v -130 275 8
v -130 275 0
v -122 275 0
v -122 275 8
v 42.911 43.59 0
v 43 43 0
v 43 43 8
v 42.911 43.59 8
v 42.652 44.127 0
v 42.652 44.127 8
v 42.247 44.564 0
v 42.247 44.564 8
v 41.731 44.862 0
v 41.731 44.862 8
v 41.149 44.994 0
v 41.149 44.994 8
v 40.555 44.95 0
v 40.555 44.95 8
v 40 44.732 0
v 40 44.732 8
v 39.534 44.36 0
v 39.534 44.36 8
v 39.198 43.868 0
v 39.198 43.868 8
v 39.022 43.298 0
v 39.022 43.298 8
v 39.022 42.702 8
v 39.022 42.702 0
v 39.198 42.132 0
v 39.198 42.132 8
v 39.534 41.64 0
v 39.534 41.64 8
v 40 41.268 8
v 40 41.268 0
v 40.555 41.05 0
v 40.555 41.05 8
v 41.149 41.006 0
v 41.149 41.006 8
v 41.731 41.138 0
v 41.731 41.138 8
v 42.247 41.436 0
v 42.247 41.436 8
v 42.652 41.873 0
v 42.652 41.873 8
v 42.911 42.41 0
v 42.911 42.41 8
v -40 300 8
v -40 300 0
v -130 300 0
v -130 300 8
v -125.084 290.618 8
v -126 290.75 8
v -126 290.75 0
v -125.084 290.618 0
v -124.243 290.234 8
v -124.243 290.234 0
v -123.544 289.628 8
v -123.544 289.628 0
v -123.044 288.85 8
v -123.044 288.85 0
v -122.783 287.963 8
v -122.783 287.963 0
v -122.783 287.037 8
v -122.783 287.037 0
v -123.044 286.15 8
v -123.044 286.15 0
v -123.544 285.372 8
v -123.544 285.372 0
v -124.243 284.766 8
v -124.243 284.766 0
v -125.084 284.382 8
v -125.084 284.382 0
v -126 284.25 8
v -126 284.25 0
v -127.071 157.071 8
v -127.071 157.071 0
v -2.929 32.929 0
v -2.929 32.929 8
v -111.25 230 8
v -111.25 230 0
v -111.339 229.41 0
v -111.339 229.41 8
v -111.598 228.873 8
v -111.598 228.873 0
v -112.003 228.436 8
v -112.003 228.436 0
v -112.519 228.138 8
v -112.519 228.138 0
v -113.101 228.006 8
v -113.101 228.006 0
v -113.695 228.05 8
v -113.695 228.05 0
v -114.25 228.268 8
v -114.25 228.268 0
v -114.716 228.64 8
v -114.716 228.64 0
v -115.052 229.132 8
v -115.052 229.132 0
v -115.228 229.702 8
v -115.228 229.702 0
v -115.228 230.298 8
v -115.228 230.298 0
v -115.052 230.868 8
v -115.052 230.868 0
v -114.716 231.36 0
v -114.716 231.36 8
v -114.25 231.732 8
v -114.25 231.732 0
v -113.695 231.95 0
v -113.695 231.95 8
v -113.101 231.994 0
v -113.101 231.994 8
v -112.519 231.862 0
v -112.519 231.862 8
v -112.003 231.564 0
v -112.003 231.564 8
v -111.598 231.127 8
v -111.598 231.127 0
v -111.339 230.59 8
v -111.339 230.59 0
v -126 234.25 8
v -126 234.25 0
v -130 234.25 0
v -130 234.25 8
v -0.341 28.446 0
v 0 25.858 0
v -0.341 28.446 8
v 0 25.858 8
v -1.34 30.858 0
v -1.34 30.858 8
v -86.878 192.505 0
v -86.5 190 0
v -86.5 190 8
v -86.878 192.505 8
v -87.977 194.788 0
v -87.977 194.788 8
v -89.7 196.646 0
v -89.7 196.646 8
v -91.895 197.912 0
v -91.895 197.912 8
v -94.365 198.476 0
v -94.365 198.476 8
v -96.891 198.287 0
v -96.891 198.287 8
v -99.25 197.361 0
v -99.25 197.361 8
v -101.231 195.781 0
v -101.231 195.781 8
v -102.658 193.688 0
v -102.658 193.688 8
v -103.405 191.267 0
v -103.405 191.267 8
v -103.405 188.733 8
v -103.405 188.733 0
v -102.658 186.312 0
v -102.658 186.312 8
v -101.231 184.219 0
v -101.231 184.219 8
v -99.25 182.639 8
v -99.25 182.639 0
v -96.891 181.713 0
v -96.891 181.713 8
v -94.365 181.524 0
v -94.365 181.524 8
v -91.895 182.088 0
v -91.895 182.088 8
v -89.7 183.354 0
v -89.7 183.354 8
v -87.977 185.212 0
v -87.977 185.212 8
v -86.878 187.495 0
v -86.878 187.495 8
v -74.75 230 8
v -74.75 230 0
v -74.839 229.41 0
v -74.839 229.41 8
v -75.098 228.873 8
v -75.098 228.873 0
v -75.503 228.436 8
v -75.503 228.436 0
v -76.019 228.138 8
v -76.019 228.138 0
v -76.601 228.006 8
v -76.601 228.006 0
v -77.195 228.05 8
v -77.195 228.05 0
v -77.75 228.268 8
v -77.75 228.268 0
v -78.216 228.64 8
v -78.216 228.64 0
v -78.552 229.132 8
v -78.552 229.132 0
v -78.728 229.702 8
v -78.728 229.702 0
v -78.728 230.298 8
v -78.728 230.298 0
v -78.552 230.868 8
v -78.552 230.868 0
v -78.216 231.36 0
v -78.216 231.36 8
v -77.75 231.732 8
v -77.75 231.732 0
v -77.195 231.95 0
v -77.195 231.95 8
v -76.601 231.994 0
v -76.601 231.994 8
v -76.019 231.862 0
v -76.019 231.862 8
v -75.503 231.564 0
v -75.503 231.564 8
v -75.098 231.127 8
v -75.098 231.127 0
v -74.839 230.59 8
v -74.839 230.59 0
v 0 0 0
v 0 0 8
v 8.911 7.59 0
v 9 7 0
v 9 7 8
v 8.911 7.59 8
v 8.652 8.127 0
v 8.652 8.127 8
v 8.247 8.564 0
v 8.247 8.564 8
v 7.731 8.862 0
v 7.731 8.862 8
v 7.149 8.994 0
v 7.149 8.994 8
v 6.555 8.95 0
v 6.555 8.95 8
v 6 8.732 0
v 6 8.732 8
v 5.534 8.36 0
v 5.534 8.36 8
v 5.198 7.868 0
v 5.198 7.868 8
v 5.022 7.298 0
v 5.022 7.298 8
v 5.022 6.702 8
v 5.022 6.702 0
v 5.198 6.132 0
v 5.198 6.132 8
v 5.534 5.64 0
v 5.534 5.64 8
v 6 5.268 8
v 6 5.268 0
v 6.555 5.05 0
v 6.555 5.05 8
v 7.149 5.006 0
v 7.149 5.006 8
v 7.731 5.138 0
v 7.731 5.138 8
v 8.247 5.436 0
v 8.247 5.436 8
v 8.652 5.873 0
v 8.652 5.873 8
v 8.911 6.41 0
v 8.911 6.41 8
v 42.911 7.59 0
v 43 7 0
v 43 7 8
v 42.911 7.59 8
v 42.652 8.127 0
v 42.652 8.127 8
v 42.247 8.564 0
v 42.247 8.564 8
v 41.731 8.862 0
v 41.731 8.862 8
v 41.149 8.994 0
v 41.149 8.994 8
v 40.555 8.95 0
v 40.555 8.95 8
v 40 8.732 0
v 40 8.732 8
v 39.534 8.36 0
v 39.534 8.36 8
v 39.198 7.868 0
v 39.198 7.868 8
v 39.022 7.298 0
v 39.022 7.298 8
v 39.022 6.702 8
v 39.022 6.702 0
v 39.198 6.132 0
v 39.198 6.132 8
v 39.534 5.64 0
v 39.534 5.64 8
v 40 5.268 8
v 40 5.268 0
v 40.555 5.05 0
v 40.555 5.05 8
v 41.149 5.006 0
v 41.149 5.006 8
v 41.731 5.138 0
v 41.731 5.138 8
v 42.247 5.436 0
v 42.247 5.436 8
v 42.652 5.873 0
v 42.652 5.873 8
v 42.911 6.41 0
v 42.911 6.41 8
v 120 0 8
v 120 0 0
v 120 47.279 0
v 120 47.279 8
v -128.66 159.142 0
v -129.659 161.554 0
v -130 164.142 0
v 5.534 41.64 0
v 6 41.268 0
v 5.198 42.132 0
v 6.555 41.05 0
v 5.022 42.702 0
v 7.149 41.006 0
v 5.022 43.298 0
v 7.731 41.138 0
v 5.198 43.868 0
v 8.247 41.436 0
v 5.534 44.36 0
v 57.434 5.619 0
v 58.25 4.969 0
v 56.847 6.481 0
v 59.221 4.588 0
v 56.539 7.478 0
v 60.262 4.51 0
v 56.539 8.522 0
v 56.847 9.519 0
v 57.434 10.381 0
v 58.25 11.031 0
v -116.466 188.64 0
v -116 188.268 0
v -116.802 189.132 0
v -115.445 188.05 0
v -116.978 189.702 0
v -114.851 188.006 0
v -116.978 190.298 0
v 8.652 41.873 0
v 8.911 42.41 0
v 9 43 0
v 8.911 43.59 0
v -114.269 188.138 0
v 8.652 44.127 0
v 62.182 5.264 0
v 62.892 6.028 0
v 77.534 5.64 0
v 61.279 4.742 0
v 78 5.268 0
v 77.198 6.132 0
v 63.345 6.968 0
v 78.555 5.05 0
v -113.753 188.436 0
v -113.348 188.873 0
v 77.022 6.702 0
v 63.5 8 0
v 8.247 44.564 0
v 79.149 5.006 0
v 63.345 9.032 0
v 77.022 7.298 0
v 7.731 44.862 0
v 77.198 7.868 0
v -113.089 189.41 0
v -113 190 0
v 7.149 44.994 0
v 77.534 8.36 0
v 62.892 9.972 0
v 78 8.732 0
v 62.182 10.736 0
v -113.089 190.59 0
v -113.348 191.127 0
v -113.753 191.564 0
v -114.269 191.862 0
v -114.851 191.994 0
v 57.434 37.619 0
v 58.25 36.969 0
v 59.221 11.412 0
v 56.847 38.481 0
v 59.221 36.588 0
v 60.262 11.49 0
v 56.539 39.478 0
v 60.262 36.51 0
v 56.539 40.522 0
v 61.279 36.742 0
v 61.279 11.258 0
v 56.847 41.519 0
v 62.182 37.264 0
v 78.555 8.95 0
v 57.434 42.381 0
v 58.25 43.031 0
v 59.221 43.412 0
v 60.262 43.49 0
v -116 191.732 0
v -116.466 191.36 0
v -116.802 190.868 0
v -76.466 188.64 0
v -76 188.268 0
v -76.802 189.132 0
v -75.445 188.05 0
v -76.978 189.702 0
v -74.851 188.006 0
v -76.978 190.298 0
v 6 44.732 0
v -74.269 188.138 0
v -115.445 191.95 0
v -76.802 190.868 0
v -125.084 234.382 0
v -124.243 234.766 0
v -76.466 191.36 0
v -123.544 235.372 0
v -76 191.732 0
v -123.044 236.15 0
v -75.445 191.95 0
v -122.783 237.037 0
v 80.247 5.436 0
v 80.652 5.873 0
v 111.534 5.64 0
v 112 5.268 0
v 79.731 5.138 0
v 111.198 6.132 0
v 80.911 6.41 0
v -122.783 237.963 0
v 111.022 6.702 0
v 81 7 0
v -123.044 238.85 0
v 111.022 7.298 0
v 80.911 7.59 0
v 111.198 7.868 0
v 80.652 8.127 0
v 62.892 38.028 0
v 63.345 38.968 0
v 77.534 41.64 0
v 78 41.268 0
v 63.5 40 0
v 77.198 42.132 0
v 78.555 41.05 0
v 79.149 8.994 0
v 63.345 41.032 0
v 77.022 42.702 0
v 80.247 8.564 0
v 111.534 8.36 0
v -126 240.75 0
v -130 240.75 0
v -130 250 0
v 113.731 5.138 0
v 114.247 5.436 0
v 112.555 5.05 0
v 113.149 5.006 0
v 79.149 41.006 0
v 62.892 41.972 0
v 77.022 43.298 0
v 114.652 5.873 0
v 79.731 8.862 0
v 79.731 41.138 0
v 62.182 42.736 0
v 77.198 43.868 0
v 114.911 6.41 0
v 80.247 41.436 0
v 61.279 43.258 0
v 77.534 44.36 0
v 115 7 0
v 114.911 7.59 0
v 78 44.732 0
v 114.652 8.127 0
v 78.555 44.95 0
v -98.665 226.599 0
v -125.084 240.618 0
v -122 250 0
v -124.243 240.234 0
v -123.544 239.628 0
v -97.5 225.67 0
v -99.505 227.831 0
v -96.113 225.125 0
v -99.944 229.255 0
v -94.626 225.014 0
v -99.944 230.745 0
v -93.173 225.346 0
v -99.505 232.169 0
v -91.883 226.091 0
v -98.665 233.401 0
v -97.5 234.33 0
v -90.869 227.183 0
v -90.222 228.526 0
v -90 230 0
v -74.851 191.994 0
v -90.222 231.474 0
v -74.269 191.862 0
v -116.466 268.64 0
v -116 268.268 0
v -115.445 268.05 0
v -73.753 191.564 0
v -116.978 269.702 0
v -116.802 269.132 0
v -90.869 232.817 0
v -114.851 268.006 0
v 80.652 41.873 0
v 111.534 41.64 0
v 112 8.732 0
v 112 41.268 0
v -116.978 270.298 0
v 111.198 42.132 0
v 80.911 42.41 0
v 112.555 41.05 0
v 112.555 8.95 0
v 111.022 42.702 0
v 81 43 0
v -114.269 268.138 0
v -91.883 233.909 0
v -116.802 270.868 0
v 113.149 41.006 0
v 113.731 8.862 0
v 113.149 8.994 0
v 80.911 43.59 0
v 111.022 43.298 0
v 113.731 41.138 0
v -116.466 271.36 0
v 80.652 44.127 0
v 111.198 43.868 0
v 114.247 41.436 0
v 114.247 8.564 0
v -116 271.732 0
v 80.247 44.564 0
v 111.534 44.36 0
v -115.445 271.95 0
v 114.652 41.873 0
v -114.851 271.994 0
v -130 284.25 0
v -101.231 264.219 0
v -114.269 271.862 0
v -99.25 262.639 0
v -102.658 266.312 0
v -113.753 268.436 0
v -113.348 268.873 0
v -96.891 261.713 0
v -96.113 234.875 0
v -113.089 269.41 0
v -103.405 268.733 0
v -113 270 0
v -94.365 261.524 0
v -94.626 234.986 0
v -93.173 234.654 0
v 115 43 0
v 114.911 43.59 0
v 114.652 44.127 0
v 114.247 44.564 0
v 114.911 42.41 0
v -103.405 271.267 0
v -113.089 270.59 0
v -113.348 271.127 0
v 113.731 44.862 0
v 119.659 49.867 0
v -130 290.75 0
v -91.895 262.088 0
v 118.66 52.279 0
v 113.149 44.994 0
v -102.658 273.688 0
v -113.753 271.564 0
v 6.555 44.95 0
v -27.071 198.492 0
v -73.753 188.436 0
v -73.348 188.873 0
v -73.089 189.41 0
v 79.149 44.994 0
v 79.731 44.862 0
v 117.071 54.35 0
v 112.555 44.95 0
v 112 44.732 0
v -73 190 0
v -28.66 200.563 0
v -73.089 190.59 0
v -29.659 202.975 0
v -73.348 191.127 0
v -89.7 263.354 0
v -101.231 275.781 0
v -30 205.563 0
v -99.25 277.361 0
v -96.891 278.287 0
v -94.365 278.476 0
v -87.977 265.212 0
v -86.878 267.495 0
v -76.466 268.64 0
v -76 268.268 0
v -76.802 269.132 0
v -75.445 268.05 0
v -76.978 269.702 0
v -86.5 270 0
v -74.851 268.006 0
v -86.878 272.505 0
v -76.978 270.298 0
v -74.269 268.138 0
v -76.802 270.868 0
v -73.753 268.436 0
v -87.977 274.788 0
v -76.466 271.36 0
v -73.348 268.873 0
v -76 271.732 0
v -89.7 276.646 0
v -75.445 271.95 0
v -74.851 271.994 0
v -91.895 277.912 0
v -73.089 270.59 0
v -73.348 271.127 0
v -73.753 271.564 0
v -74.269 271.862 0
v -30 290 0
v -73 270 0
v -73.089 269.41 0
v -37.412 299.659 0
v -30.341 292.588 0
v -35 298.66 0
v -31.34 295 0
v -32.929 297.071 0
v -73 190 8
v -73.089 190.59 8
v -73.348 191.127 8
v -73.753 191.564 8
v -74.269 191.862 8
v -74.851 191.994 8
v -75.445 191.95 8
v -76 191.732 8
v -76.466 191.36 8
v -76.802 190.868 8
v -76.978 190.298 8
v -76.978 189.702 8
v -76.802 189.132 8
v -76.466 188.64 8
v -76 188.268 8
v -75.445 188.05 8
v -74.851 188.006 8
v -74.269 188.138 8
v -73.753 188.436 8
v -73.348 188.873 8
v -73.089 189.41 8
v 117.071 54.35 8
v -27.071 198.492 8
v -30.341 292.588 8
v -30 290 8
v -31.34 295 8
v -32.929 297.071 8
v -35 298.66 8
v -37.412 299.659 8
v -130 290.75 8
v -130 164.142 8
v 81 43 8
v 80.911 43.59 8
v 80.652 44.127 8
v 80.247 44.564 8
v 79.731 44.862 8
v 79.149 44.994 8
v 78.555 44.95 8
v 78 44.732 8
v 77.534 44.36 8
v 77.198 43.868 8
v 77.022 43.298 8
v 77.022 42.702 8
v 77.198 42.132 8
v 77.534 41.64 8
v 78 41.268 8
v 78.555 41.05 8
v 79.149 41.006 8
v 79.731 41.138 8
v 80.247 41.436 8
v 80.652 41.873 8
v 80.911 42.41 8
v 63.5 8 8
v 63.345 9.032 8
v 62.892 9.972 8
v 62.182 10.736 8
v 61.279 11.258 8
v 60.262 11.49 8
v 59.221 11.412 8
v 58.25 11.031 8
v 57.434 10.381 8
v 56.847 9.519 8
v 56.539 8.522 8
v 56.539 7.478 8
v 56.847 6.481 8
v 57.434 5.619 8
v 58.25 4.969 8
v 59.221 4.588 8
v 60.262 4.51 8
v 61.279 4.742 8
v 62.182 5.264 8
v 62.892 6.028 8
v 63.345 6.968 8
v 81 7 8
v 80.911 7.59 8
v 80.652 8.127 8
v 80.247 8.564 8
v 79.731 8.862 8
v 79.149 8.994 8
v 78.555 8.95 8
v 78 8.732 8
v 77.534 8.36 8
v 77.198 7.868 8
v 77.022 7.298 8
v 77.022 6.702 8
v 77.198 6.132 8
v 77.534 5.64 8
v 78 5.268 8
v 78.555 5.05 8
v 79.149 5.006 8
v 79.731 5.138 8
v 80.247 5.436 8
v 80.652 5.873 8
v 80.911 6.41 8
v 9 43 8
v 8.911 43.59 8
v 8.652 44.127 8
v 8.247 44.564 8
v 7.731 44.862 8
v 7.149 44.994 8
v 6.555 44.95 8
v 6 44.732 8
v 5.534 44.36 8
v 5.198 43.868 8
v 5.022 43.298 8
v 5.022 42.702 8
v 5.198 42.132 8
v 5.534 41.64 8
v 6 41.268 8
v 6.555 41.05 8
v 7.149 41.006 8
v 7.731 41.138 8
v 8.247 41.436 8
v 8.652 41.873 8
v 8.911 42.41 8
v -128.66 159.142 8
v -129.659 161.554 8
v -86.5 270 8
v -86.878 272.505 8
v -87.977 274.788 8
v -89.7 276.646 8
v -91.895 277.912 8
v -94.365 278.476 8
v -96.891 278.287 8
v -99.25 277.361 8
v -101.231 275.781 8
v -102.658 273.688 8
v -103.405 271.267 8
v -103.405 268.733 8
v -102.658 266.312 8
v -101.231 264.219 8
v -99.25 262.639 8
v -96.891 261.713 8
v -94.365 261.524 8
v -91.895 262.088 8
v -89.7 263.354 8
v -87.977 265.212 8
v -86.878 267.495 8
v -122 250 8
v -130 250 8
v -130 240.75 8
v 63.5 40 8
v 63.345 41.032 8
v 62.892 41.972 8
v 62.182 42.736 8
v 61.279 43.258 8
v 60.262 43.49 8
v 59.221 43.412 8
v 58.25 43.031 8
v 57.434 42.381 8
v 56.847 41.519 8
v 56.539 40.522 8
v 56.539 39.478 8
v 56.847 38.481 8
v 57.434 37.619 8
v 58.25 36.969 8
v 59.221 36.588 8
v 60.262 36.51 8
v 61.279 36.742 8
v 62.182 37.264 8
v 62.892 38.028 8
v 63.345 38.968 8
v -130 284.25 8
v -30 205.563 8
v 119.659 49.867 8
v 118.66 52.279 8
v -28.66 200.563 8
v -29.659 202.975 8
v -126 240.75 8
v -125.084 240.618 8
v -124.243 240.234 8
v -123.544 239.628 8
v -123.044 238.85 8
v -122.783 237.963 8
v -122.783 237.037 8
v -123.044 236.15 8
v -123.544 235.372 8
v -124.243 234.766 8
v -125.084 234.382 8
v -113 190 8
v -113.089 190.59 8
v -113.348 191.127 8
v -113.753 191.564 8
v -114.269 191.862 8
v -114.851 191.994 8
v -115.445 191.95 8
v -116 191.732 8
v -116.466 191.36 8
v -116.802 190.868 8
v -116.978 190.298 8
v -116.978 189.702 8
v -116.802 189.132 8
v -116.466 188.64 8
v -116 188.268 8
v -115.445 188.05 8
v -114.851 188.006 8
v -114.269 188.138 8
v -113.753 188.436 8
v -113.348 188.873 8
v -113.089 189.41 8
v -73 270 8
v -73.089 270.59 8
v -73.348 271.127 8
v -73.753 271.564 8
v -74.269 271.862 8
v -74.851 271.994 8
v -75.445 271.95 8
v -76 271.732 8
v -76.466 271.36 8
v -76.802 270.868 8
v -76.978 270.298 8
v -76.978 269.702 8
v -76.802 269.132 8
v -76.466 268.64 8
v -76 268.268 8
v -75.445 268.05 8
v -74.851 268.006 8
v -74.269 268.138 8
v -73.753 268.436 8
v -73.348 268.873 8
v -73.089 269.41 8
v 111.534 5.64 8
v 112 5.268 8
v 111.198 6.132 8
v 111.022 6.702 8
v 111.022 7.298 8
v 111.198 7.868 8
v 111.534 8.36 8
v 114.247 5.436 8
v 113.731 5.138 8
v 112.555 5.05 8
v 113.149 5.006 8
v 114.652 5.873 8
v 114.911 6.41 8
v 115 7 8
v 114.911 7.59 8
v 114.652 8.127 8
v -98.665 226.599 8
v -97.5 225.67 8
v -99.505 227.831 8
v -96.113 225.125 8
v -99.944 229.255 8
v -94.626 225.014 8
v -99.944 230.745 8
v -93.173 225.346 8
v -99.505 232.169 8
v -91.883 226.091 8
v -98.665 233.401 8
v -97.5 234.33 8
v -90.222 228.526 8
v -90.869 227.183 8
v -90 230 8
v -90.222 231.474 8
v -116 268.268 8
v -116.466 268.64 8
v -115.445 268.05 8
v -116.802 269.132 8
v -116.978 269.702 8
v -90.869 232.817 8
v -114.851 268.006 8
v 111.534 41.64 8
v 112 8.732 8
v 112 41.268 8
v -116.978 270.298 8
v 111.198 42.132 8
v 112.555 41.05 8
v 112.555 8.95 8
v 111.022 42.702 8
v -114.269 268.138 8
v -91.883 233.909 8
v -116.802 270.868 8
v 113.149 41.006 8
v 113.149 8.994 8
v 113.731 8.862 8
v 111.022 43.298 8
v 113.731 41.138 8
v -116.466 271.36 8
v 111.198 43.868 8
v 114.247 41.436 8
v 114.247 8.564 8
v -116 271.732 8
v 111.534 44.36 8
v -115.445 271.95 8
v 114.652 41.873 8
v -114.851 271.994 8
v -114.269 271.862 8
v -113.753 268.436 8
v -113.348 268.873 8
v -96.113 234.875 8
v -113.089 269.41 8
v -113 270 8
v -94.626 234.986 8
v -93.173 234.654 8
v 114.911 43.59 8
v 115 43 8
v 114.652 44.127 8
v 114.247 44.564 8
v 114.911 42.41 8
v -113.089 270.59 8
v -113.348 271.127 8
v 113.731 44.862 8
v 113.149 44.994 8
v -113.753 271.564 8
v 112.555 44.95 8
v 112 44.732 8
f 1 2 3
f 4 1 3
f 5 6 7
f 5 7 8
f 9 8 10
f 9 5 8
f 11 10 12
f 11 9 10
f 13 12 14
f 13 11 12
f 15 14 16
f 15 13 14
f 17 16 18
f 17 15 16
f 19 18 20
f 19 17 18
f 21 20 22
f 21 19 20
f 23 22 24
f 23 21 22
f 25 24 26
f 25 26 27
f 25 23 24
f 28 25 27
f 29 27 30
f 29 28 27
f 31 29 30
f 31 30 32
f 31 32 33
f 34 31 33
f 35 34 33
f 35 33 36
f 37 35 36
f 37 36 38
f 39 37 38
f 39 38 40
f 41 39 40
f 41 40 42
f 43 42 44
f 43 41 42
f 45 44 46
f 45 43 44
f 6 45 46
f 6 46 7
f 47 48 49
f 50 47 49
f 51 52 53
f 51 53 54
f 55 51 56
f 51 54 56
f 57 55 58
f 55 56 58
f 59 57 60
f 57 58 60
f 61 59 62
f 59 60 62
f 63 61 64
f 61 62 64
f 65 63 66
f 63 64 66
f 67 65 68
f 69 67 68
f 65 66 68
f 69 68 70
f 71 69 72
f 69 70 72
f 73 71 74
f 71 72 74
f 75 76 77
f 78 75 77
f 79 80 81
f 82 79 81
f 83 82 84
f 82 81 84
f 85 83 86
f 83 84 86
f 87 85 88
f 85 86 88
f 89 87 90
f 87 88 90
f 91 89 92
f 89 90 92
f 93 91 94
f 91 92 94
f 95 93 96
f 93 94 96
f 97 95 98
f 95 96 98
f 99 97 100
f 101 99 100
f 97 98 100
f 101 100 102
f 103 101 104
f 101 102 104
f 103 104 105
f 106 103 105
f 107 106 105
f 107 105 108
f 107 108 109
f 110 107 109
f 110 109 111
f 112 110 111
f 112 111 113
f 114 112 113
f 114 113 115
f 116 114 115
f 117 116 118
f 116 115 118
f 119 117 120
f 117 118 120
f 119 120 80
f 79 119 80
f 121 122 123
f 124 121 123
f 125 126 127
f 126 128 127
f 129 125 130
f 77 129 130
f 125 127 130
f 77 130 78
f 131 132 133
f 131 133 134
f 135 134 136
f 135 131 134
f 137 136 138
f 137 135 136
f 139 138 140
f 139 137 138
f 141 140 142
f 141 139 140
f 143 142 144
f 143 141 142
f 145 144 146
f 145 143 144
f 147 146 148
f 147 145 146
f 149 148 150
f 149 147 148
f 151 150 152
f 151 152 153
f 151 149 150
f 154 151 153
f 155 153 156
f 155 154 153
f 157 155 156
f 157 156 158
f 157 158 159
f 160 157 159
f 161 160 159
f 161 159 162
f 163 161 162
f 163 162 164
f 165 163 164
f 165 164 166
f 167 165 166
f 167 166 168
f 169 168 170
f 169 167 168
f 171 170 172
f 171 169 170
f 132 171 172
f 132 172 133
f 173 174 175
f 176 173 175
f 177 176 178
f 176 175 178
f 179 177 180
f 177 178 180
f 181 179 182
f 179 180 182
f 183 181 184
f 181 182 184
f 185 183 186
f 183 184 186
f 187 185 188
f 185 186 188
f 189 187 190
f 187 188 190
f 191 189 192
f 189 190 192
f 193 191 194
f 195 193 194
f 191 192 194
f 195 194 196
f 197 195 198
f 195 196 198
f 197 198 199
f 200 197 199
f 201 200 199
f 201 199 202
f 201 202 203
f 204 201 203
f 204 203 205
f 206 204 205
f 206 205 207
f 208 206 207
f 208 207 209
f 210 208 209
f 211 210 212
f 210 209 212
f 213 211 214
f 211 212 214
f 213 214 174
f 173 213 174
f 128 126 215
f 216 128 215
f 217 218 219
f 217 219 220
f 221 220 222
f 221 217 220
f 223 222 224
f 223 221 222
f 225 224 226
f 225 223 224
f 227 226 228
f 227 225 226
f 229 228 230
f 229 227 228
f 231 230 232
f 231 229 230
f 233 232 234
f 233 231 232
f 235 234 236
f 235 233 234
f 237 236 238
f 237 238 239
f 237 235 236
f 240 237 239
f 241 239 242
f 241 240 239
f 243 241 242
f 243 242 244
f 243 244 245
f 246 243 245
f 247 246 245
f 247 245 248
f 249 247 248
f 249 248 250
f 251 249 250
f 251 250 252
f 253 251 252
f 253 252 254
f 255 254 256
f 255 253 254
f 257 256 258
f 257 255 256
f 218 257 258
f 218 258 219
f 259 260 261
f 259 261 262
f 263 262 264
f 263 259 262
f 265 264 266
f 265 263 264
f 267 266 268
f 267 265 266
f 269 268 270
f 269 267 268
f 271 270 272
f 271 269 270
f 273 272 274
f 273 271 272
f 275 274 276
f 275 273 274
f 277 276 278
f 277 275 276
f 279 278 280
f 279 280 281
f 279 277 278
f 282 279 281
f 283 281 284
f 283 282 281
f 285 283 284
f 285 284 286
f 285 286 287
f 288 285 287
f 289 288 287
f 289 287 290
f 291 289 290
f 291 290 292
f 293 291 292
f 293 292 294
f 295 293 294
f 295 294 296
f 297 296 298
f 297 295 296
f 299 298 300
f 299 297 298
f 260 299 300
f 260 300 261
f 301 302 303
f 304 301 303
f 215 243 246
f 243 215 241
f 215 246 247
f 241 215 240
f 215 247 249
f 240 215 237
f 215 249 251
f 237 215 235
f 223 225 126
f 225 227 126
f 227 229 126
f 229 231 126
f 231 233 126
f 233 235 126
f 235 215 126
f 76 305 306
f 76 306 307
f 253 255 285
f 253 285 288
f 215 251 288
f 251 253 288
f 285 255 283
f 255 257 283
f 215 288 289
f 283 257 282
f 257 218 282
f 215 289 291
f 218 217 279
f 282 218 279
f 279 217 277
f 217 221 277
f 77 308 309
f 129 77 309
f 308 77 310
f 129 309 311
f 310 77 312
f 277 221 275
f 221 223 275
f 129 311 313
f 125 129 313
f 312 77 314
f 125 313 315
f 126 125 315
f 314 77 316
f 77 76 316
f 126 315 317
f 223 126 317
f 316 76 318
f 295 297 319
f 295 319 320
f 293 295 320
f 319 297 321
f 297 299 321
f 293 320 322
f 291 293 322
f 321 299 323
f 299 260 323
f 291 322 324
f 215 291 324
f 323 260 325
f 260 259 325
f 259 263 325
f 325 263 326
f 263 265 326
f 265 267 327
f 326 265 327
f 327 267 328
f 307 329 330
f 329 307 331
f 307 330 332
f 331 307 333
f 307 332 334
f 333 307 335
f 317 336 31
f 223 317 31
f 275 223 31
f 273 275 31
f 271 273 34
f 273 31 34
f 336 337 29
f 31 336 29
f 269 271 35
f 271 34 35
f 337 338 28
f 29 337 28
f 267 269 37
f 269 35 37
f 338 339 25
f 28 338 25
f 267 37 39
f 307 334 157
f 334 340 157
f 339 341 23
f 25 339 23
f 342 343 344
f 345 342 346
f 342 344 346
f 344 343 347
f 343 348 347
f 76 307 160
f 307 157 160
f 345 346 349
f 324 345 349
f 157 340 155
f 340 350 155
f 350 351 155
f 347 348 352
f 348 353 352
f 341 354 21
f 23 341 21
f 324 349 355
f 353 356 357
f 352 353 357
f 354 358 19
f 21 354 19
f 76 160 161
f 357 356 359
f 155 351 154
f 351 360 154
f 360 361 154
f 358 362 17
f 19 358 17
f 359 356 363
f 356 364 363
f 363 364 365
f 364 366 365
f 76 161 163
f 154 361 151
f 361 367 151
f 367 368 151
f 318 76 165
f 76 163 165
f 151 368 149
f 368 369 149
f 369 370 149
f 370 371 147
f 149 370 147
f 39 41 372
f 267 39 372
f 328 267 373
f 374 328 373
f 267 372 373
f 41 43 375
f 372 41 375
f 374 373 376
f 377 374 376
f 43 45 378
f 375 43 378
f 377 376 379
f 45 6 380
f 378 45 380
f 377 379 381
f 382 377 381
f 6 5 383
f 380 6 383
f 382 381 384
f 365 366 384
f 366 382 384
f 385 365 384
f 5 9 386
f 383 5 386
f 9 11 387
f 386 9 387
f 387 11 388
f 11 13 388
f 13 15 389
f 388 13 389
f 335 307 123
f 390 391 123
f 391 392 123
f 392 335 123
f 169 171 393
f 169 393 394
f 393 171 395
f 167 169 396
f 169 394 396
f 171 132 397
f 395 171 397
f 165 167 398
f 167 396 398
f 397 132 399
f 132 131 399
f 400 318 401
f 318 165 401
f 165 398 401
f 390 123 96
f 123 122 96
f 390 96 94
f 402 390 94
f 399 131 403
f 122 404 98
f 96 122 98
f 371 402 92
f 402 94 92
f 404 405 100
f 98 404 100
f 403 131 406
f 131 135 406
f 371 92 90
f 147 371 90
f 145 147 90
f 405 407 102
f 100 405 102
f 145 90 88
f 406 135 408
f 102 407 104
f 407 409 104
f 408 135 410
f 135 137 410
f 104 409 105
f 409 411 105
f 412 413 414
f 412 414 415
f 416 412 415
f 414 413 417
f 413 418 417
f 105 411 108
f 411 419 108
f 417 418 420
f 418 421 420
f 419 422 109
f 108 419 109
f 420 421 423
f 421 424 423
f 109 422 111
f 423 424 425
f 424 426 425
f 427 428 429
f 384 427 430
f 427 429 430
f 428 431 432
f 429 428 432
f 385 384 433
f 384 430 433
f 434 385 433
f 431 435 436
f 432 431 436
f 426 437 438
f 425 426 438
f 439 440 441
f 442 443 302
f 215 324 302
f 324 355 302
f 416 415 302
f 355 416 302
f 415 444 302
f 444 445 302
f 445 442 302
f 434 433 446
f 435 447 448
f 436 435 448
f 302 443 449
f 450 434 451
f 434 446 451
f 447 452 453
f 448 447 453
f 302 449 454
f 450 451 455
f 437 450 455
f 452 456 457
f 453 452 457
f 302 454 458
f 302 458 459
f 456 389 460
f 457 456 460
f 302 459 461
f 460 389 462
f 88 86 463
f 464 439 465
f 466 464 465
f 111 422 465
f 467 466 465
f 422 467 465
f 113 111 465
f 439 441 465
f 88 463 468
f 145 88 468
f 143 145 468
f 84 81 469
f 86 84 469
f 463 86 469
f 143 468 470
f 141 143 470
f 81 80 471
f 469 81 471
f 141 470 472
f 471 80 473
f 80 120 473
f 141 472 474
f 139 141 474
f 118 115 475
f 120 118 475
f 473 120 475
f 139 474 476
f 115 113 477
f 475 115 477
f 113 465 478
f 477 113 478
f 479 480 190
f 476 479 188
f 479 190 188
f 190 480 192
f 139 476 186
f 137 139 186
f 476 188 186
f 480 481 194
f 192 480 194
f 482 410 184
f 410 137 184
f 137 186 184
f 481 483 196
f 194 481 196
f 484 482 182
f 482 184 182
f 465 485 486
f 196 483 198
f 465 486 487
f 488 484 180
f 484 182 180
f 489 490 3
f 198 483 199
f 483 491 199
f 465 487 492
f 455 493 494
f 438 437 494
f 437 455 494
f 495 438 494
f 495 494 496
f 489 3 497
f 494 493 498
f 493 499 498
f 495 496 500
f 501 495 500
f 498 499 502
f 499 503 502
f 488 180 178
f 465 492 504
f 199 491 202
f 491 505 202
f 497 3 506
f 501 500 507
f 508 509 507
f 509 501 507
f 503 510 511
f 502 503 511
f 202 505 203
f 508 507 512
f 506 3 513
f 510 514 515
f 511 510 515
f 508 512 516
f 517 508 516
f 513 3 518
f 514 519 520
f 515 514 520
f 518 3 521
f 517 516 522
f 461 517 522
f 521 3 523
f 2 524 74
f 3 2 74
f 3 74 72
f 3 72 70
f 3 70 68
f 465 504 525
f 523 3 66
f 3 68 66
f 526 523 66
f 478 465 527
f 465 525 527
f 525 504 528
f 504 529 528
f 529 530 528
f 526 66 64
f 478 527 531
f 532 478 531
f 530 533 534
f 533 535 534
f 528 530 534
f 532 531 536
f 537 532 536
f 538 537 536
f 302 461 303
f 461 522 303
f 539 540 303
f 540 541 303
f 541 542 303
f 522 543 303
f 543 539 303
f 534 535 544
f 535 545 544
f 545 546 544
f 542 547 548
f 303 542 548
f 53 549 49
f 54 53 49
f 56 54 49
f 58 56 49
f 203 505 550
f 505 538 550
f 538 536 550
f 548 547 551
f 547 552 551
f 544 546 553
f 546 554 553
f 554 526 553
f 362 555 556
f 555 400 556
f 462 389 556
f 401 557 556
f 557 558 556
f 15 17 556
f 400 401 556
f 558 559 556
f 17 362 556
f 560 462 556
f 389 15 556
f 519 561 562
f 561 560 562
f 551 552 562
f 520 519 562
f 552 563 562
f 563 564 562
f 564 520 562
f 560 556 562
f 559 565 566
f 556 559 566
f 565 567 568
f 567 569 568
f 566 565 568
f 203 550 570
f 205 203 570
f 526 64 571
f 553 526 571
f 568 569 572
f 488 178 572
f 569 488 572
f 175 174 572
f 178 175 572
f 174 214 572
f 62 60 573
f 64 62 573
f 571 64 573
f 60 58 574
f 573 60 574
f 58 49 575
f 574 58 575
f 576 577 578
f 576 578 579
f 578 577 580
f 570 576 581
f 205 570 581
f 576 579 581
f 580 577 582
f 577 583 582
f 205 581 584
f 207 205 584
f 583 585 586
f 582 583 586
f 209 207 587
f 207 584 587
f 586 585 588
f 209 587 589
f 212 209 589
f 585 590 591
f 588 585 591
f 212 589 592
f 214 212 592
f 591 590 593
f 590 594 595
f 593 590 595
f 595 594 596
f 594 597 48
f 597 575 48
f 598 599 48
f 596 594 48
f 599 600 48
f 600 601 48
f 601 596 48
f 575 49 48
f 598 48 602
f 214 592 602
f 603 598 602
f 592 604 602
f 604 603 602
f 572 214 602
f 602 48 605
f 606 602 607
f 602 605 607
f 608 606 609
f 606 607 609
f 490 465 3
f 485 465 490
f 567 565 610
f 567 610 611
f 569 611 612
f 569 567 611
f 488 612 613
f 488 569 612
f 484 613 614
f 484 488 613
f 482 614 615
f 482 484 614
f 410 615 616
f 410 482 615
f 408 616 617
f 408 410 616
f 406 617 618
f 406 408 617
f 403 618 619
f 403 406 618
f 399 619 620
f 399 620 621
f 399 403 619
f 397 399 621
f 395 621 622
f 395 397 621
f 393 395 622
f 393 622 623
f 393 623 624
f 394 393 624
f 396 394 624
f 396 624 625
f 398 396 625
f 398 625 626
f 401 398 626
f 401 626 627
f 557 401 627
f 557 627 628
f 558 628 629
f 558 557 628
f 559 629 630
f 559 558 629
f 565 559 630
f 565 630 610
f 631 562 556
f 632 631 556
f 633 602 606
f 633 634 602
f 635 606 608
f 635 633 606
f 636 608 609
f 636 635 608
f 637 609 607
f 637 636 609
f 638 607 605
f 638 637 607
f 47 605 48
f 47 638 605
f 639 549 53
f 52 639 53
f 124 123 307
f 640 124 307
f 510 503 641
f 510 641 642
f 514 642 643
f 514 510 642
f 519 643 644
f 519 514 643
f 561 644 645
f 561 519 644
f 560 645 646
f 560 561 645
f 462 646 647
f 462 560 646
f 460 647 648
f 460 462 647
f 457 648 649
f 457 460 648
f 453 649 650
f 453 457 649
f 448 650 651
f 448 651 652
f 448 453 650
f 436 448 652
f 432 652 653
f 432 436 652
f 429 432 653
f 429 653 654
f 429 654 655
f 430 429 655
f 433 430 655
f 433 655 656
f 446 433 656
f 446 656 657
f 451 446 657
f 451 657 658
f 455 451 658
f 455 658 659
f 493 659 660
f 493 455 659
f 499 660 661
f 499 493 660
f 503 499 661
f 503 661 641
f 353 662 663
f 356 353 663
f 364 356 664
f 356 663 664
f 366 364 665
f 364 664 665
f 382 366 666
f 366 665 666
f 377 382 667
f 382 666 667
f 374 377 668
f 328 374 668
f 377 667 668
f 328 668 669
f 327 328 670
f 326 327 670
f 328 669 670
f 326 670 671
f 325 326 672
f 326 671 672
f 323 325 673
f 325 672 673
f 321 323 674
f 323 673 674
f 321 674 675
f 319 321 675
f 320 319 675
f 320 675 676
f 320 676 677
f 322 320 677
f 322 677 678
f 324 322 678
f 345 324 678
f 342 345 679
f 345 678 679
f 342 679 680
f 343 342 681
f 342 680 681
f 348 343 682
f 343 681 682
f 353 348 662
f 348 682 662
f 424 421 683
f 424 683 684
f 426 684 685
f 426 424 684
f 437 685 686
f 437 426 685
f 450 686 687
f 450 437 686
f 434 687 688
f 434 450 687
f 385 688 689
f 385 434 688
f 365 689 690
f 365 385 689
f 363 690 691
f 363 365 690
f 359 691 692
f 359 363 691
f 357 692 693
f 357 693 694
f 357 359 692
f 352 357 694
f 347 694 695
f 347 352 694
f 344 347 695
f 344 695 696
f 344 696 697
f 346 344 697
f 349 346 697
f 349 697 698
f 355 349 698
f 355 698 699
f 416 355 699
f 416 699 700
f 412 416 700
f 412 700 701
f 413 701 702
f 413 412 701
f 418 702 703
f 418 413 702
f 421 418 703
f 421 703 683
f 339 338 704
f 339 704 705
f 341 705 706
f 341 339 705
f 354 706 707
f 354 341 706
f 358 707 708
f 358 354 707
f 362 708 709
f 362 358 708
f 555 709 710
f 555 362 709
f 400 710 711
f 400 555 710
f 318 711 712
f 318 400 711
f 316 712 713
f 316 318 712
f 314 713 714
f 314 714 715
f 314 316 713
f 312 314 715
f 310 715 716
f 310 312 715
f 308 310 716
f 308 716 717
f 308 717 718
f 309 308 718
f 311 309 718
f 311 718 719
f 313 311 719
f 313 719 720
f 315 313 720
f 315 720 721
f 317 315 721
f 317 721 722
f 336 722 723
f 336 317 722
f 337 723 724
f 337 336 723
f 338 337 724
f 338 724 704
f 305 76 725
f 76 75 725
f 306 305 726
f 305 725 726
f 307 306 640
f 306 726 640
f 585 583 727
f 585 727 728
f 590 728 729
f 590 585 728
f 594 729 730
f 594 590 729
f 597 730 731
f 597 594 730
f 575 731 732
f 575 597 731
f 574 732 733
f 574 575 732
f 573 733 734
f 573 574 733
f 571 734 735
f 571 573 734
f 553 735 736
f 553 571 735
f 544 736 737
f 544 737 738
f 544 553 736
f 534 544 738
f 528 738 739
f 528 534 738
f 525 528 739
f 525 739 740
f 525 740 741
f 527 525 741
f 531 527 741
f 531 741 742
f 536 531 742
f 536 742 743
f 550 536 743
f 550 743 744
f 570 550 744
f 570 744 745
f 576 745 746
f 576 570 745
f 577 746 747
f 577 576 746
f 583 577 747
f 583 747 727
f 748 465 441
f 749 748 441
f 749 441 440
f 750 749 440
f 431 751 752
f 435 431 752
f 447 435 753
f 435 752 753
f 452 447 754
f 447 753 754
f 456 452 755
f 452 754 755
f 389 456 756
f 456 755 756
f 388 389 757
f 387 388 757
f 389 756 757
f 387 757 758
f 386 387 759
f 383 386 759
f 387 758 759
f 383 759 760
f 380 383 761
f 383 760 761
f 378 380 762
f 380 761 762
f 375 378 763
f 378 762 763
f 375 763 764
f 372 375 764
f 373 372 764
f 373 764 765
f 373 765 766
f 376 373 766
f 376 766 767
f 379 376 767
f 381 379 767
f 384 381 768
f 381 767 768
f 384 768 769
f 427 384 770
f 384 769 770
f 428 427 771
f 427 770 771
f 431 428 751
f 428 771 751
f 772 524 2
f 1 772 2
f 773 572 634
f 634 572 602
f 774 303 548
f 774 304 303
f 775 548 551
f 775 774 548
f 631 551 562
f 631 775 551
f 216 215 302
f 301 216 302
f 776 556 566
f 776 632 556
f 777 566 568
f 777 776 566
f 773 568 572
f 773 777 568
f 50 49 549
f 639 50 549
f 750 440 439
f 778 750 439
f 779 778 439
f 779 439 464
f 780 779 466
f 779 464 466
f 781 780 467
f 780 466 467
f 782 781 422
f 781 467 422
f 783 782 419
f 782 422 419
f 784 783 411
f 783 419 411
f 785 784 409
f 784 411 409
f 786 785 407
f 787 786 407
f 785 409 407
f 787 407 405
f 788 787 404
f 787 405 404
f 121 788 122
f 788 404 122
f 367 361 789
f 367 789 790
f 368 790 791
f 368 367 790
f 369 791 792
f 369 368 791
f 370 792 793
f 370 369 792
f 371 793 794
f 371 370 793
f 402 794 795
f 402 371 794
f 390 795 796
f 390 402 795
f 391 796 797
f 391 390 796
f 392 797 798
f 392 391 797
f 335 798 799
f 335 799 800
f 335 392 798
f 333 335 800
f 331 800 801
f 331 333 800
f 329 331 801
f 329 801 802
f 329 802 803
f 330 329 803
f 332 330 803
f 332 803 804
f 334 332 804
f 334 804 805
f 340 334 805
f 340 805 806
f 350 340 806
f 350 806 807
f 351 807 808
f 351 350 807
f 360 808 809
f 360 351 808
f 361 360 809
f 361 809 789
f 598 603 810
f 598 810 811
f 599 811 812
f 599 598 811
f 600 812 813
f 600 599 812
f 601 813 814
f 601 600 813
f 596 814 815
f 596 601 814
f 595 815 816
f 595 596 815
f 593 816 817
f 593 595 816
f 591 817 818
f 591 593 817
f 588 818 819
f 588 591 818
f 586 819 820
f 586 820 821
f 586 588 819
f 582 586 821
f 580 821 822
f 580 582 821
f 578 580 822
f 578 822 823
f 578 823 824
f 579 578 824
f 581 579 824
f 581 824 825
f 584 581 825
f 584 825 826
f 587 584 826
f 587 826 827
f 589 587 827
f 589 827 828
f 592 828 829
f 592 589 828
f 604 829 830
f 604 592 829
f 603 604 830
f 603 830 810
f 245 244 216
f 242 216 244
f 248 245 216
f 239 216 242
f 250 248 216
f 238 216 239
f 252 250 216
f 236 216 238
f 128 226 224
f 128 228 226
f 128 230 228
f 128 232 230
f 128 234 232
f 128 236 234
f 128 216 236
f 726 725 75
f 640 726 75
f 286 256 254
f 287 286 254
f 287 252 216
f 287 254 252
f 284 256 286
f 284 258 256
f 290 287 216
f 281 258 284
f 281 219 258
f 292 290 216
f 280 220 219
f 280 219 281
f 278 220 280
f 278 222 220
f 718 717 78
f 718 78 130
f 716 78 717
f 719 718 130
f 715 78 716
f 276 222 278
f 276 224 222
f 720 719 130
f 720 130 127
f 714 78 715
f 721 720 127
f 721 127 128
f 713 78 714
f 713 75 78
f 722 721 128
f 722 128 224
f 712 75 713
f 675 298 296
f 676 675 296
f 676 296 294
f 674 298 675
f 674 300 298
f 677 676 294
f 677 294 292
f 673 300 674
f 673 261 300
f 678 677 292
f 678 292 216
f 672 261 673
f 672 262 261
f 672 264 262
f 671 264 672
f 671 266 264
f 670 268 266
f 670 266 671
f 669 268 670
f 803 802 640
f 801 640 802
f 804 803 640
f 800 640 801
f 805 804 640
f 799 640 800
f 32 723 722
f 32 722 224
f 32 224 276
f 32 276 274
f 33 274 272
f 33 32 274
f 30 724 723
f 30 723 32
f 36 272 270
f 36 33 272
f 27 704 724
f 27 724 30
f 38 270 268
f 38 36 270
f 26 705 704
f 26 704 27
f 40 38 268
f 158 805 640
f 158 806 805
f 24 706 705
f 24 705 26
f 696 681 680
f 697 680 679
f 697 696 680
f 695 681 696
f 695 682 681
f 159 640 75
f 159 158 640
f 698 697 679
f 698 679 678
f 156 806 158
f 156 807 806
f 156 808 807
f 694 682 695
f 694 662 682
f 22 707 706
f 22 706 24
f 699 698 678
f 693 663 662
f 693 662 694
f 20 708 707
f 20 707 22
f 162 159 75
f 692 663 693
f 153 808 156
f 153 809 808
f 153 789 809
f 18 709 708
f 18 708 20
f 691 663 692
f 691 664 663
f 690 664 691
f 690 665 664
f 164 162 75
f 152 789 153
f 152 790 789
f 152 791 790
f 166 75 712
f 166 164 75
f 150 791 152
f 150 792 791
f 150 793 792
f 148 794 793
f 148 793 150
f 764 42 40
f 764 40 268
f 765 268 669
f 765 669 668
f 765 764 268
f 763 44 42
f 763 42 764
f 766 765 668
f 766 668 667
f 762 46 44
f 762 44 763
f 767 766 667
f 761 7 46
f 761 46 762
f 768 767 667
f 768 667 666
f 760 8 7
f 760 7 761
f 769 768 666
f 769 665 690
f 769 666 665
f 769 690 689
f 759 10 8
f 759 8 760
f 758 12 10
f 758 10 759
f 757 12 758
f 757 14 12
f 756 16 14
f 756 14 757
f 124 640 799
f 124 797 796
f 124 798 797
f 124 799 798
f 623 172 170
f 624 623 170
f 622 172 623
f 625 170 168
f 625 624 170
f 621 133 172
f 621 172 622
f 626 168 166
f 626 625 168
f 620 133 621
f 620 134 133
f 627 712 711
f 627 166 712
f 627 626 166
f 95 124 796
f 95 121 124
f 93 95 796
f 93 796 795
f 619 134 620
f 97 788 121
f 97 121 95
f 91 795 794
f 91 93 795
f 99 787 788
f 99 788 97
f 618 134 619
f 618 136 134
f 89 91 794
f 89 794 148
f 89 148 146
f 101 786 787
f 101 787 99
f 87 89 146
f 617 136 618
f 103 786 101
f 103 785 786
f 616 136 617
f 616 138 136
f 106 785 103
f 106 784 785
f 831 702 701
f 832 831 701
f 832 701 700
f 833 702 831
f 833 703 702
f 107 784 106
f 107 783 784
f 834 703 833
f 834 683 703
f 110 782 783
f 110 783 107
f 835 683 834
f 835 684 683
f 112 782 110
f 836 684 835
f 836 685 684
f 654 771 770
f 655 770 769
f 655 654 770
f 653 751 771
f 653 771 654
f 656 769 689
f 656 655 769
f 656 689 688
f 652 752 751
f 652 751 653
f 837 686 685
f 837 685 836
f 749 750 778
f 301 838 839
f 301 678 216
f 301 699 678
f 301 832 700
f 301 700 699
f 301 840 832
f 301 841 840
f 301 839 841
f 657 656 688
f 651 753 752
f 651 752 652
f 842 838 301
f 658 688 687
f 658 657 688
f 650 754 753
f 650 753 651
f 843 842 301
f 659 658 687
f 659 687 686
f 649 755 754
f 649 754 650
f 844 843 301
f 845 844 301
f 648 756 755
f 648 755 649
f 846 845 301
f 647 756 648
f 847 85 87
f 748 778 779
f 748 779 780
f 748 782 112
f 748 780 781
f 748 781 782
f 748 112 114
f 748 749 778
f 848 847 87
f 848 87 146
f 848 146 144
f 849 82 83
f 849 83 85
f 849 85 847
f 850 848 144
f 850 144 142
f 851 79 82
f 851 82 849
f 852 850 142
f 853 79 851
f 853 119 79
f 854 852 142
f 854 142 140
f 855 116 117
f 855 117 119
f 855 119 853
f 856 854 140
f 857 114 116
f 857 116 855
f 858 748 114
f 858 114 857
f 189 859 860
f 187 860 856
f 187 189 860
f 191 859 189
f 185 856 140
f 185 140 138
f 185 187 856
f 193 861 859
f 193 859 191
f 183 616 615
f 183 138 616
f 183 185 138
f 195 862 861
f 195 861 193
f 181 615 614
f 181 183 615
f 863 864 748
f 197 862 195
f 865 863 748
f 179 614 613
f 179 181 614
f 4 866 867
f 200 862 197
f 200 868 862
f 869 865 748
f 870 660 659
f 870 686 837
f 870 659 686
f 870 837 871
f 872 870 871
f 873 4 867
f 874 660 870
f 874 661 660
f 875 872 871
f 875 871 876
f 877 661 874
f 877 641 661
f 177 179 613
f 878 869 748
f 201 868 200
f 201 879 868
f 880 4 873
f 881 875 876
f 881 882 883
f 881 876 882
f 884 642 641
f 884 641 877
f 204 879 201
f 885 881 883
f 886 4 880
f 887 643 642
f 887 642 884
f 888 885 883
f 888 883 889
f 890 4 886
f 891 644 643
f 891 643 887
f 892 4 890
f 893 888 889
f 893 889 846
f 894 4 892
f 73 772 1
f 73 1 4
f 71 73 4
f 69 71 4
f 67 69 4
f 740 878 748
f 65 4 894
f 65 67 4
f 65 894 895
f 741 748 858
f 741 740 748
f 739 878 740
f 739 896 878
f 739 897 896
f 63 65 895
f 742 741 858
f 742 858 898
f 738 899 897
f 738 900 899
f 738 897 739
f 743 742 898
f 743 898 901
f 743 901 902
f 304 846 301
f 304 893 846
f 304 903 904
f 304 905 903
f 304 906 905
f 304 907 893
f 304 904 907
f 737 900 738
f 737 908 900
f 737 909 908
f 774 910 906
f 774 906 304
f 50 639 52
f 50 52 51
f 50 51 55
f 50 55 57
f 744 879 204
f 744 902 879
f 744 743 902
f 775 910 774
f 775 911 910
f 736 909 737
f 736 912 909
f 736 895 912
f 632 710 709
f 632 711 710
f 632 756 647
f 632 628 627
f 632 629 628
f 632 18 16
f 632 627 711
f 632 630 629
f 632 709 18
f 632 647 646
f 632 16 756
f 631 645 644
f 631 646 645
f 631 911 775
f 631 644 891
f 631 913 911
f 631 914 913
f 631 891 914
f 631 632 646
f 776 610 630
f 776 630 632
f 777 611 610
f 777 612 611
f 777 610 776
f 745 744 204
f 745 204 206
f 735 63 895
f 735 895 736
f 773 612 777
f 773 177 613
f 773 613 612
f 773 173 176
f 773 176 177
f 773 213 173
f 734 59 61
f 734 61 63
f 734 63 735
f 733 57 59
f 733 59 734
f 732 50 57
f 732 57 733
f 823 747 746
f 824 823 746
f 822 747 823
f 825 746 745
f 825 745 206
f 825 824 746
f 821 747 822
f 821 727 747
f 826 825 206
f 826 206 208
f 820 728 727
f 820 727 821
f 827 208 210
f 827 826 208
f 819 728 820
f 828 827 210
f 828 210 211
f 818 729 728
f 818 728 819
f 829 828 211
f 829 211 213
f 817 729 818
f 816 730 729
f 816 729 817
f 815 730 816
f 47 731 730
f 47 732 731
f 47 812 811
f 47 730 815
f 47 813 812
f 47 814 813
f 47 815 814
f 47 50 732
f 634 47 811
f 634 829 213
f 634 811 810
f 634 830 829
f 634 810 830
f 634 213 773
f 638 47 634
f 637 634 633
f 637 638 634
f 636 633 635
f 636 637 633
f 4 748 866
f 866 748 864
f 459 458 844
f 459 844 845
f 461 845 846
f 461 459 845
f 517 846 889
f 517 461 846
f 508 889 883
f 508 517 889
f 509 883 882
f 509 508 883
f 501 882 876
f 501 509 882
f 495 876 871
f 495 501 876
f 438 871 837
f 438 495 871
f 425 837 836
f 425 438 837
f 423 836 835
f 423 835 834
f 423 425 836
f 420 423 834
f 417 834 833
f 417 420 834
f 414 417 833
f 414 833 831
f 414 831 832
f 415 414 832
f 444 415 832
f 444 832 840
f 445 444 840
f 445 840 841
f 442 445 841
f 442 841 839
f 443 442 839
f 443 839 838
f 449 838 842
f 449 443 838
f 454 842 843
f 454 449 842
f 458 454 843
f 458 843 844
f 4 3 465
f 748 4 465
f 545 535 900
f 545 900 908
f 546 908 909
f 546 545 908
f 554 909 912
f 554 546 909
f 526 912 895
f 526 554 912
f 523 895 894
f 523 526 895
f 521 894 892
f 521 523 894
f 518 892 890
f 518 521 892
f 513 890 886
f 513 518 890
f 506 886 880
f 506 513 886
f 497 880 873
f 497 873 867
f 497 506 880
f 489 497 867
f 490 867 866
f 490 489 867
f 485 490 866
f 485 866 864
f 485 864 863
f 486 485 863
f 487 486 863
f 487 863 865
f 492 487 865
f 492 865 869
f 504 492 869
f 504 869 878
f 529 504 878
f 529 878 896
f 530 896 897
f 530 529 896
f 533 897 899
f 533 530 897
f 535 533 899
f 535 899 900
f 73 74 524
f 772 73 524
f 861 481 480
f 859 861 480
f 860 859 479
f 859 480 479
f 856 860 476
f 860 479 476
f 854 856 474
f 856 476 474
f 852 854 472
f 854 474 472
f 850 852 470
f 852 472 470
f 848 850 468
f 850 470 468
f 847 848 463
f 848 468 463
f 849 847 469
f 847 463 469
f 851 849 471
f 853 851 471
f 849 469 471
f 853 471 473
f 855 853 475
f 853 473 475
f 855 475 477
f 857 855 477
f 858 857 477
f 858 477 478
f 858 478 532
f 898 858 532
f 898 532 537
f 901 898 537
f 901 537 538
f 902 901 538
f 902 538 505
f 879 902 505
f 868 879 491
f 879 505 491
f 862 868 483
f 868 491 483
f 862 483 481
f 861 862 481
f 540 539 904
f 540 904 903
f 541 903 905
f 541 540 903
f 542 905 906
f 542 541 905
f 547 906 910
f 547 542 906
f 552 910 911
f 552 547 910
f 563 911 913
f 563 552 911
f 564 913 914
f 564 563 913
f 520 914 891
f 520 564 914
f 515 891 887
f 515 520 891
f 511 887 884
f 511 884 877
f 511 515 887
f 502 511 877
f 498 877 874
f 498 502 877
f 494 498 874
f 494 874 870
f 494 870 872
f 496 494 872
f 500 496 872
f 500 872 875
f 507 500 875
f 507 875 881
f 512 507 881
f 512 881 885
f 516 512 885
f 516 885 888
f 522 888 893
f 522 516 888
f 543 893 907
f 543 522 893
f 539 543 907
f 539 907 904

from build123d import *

# Parameters (mm, degrees)
F0_R     = 2
F0_R_2   = 8.5
F1_DEPTH = 8
F2_R     = 3.5
F3_DEPTH = 8
F4_R     = 5
F4_R_2   = 2
F5_DEPTH = 8
F6_R     = 10


with BuildPart() as f1:
    # F0 (on Top) → F1 (new body)
    with BuildSketch(Plane.XY):
        with BuildLine():
            Line((0, 30), (0, 0))
            Line((0, 0), (120, 0))
            Line((120, 0), (120, 51.421356))
            Line((120, 51.421356), (-30, 201.421356))
            Line((-30, 201.421356), (-30, 300))
            Line((-30, 300), (-130, 300))
            Line((-130, 300), (-130, 290.75))
            Line((-130, 290.75), (-126, 290.75))
            ThreePointArc((-126, 290.75), (-122.75, 287.5), (-126, 284.25))
            Line((-126, 284.25), (-130, 284.25))
            Line((-130, 284.25), (-130, 275))
            Line((-130, 275), (-122, 275))
            Line((-122, 275), (-122, 250))
            Line((-122, 250), (-130, 250))
            Line((-130, 250), (-130, 240.75))
            Line((-130, 240.75), (-126, 240.75))
            ThreePointArc((-126, 240.75), (-122.75, 237.5), (-126, 234.25))
            Line((-126, 234.25), (-130, 234.25))
            Line((-130, 234.25), (-130, 160))
            Line((-130, 160), (0, 30))
        make_face()
        with Locations((7, 7)):
            Circle(F0_R, mode=Mode.SUBTRACT)
        with Locations((41, 7)):
            Circle(F0_R, mode=Mode.SUBTRACT)
        with Locations((7, 43)):
            Circle(F0_R, mode=Mode.SUBTRACT)
        with Locations((41, 43)):
            Circle(F0_R, mode=Mode.SUBTRACT)
        with Locations((79, 7)):
            Circle(F0_R, mode=Mode.SUBTRACT)
        with Locations((113, 7)):
            Circle(F0_R, mode=Mode.SUBTRACT)
        with Locations((79, 43)):
            Circle(F0_R, mode=Mode.SUBTRACT)
        with Locations((113, 43)):
            Circle(F0_R, mode=Mode.SUBTRACT)
        with Locations((-115, 190)):
            Circle(F0_R, mode=Mode.SUBTRACT)
        with Locations((-95, 190)):
            Circle(F0_R_2, mode=Mode.SUBTRACT)
        with Locations((-75, 190)):
            Circle(F0_R, mode=Mode.SUBTRACT)
        with Locations((-115, 270)):
            Circle(F0_R, mode=Mode.SUBTRACT)
        with Locations((-95, 270)):
            Circle(F0_R_2, mode=Mode.SUBTRACT)
        with Locations((-75, 270)):
            Circle(F0_R, mode=Mode.SUBTRACT)
    extrude(amount=F1_DEPTH)

    # F2 (on face) → F3 (cut, through all)
    with BuildSketch(Plane.XY.offset(8)):
        with Locations((60, 8)):
            Circle(F2_R)
        with Locations((60, 40)):
            Circle(F2_R)
    extrude(amount=-F3_DEPTH, mode=Mode.SUBTRACT)

    # F4 (on face) → F5 (cut, through all)
    with BuildSketch(Plane(origin=(0, 0, 0), x_dir=(1, 0, 0), z_dir=(0, 0, -1))):
        with Locations((-95, -230)):
            Circle(F4_R)
        with Locations((-76.75, -230)):
            Circle(F4_R_2)
        with Locations((-113.25, -230)):
            Circle(F4_R_2)
    extrude(amount=-F5_DEPTH, mode=Mode.SUBTRACT)

    # F6
    f6_edges = [f1.edges().sort_by_distance(p)[0] for p in [
        (-130, 160, 4),
        (-30, 300, 4),
        (-30, 201.421356, 4),
        (120, 51.421356, 4),
        (0, 30, 4),
    ]]
    fillet(f6_edges, radius=F6_R)


solid = f1.part
